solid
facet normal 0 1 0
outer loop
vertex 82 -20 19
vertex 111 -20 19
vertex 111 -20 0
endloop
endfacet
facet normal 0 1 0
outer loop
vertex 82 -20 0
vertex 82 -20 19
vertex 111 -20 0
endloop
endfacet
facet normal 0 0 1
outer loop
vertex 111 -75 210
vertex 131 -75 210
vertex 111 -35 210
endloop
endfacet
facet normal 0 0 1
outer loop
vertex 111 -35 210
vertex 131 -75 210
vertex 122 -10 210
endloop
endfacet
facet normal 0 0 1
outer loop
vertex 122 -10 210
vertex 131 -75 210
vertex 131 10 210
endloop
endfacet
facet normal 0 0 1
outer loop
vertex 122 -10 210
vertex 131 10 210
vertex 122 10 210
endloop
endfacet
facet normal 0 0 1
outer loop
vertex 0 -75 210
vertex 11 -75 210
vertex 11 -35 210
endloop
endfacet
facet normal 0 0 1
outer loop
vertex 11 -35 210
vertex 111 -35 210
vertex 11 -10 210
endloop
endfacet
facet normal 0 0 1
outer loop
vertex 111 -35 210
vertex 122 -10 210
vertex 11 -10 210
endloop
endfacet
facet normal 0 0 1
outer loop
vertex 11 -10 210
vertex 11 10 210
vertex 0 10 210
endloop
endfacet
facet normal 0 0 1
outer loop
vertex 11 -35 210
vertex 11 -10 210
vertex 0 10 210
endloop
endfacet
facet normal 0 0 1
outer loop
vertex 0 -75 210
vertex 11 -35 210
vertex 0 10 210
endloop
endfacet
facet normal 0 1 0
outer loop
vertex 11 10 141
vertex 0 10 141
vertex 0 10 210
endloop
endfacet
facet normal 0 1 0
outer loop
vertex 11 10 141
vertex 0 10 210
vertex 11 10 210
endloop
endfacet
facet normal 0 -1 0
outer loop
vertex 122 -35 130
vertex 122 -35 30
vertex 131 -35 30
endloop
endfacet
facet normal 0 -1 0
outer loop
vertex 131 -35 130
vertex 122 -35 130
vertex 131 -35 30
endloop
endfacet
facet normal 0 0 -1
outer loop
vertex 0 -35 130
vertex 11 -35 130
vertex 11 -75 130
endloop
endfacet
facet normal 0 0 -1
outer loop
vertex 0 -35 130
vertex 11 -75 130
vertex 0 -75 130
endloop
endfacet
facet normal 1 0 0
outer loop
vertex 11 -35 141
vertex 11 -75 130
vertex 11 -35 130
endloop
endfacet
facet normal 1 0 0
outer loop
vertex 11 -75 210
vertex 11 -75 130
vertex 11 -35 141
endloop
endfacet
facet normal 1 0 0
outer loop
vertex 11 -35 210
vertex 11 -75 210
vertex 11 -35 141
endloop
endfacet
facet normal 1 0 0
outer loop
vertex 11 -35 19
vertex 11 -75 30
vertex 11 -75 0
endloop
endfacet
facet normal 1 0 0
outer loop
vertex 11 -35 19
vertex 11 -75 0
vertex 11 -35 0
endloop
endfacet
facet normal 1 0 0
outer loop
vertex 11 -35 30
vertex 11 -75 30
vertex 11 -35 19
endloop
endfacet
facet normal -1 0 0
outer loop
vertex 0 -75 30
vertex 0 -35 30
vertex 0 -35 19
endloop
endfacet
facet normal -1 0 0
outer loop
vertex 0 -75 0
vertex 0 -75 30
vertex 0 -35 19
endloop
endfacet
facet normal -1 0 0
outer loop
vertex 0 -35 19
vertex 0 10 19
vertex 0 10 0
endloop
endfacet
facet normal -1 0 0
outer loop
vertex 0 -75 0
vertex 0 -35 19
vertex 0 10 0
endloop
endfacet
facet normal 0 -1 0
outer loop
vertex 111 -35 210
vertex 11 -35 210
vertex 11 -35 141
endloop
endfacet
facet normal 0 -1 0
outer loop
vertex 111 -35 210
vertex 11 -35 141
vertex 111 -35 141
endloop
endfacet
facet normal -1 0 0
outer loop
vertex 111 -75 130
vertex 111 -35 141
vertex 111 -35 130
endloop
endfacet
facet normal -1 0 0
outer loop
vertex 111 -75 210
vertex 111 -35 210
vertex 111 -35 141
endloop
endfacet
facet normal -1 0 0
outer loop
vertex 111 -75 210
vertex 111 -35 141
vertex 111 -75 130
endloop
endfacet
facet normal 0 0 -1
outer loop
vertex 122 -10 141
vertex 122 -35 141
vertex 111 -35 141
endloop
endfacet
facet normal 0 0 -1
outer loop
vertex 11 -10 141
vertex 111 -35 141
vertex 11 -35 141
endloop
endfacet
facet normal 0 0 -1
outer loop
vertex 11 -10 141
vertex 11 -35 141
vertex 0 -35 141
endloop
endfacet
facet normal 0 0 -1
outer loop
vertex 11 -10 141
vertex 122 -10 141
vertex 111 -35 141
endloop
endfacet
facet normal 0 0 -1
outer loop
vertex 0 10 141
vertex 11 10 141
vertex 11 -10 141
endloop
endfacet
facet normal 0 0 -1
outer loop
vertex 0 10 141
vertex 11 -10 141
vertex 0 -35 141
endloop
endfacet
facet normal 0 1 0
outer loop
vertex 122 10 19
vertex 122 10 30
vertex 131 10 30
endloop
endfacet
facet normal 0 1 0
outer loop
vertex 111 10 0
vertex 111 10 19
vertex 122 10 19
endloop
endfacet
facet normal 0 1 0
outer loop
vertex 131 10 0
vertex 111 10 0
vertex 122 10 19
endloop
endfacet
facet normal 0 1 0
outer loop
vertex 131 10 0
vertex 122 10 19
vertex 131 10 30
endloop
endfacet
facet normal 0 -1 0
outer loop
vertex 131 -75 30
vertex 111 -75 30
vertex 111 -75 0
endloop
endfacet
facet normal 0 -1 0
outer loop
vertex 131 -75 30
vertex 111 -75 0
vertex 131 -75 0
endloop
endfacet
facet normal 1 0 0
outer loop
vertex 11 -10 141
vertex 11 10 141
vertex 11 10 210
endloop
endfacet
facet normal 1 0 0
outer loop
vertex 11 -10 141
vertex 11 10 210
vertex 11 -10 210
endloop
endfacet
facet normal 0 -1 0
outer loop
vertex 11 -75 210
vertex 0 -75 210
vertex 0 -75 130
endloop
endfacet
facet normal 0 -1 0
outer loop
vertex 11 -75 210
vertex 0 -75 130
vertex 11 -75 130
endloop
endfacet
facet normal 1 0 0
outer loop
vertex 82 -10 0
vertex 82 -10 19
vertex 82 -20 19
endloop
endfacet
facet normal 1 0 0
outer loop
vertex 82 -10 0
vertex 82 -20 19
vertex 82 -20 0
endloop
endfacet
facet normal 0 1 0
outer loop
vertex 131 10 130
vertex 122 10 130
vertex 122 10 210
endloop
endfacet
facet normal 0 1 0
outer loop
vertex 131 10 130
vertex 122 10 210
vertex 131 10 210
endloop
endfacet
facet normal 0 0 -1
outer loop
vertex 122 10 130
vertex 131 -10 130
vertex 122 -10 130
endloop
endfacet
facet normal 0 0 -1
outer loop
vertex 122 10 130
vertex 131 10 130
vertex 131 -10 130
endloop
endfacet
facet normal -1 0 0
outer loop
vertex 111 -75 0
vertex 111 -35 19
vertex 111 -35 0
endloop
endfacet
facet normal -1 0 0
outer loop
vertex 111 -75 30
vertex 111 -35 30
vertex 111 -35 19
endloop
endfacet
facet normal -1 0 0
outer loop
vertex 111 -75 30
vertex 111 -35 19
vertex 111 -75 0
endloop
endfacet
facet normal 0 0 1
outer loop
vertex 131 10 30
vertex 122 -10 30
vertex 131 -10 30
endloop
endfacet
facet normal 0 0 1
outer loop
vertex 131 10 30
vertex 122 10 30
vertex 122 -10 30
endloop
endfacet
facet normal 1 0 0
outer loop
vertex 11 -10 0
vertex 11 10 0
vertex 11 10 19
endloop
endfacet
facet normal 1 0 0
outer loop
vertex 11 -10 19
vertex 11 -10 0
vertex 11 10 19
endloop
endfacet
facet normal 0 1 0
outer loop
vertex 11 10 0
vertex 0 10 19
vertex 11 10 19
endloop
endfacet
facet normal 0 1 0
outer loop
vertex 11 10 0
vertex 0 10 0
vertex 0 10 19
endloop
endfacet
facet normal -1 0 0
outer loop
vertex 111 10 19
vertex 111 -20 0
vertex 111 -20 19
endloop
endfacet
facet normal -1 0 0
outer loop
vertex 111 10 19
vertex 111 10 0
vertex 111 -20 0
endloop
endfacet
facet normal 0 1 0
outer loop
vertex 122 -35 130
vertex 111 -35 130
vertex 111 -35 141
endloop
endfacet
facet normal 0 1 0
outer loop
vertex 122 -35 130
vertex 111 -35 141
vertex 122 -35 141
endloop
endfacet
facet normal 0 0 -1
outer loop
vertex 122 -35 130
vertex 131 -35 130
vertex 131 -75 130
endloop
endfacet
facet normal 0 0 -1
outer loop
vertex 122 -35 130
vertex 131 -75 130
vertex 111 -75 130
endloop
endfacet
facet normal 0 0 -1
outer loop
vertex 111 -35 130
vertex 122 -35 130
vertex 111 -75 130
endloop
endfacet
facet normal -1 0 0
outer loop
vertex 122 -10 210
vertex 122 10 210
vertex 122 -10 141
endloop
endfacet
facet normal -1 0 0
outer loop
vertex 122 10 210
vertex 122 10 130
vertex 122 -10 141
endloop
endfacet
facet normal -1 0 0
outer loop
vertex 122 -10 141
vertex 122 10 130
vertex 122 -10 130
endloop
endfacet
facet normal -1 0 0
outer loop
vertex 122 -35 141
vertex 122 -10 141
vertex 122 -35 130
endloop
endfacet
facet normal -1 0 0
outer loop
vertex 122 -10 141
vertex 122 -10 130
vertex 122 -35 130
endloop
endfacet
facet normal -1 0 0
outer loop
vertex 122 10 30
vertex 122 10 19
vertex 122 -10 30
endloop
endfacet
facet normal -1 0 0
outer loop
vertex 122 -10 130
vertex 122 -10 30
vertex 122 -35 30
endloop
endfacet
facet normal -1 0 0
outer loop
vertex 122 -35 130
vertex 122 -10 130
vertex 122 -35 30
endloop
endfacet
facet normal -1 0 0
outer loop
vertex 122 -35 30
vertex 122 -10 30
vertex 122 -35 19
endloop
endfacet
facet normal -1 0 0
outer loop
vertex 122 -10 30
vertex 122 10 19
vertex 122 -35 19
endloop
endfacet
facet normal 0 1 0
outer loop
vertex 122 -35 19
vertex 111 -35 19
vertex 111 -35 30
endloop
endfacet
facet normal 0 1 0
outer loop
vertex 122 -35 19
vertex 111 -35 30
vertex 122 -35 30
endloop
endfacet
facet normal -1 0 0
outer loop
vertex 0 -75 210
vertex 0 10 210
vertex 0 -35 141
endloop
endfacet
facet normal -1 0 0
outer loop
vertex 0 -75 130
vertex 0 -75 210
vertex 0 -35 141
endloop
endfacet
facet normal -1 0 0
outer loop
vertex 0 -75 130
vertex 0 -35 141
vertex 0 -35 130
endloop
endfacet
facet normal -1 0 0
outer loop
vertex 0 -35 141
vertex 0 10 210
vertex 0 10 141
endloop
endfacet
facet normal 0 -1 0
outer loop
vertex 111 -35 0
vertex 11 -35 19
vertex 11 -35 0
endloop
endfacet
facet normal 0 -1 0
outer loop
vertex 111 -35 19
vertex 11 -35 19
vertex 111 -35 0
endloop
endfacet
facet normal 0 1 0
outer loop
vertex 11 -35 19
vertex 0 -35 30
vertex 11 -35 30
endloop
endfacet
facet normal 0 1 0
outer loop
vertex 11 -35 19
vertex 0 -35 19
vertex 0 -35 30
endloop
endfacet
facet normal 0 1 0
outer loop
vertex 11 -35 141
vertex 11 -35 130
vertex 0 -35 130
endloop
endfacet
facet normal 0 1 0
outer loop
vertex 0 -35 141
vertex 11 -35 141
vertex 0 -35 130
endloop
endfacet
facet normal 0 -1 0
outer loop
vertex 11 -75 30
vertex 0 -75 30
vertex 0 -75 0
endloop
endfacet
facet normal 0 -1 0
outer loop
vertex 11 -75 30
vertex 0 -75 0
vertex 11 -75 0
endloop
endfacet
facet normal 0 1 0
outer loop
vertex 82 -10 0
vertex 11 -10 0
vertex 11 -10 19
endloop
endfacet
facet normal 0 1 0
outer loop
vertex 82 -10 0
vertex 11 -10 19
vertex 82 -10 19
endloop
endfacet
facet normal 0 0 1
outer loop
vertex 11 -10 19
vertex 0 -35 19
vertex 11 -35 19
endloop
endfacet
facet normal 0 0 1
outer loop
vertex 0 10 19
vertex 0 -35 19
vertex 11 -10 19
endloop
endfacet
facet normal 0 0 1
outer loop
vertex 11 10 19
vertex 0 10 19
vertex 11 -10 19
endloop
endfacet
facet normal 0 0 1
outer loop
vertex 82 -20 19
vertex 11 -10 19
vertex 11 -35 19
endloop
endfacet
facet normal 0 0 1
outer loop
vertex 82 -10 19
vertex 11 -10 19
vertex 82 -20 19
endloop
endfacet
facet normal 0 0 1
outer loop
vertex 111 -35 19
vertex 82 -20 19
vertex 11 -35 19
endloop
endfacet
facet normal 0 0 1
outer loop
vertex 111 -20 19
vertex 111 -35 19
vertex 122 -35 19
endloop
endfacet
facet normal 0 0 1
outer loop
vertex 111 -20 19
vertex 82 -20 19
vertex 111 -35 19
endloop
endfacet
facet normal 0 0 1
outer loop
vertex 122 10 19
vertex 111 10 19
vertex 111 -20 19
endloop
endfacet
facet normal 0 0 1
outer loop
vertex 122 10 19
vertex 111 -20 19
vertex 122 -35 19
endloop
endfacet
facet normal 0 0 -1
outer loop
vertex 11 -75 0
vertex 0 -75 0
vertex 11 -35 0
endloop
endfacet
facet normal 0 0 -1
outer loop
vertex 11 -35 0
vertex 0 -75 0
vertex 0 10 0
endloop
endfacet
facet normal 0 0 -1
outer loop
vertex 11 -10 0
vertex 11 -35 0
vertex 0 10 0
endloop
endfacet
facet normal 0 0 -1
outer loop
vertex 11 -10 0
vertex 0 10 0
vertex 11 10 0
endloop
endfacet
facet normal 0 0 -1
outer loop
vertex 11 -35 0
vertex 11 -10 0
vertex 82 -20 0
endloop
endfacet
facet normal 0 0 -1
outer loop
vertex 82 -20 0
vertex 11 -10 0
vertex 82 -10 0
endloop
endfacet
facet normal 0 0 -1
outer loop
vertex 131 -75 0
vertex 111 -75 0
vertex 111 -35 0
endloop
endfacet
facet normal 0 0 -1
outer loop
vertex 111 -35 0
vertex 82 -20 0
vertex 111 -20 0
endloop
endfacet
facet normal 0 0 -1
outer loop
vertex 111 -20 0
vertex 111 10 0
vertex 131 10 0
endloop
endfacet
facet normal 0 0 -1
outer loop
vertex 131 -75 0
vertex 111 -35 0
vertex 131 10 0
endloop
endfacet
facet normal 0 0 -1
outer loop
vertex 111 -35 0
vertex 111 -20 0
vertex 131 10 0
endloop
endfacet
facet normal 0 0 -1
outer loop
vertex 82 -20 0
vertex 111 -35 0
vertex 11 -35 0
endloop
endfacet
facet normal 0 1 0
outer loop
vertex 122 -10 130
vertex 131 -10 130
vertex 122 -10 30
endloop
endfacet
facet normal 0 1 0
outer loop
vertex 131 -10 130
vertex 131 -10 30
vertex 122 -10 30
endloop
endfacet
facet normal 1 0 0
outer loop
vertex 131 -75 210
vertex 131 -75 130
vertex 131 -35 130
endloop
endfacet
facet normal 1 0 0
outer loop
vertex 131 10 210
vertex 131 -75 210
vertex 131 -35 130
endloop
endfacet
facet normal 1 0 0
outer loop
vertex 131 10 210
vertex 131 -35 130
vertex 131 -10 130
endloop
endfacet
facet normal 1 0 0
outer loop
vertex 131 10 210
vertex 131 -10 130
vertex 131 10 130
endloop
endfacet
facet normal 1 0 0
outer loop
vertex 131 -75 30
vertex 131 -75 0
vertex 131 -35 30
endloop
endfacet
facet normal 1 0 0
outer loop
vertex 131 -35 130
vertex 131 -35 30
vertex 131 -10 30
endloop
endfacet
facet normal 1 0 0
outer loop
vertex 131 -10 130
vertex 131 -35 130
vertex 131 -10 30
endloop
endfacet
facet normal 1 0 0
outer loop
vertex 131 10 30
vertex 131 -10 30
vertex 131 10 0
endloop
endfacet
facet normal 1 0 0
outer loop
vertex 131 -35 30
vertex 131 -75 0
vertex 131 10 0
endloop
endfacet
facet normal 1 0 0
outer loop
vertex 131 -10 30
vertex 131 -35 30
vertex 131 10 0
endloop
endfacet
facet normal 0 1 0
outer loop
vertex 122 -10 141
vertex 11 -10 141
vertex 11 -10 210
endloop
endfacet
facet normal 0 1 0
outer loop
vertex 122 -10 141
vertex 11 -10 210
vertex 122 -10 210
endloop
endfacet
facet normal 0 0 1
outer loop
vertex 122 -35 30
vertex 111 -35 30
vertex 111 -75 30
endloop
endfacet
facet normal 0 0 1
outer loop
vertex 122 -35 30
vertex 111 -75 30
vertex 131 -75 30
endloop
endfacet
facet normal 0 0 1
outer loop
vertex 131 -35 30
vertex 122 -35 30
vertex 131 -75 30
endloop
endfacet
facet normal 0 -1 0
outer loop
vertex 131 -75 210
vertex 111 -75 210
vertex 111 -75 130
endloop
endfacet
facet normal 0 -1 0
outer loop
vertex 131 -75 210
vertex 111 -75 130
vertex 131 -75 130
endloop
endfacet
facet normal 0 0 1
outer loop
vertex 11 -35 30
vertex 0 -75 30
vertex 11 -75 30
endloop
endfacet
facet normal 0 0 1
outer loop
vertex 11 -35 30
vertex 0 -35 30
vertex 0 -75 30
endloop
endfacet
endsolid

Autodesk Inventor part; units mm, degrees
ref_plane "YZ Plane" through (0, 0, 0) normal (1, 0, 0) x (0, 1, 0)
ref_plane "XZ Plane" through (0, 0, 0) normal (0, 1, 0) x (-1, 0, 0)
ref_plane "XY Plane" through (0, 0, 0) normal (0, 0, 1) x (1, 0, 0)
sketch "Sketch1" plane through (0, 0, 0) normal (0, 1, 0) x (-1, 0, 0)
  point P0 (0, 0)
sketch "Sketch2" plane through (0, 0, 0) normal (0, 1, 0) x (-1, 0, 0)
  line L0 (0, 0) -> (-160, 0)
  line L1 (-160, 0) -> (-160, 210)
  line L2 (-160, 210) -> (0, 210)
  line L3 (0, 210) -> (0, 0)
  dimension "d0" = 160
  dimension "d1" = 210
extrude "Extrusion1" add sketch "Sketch2" against normal blind 55
sketch "Sketch3" plane through (0, 0, 0) normal (-1, 0, 0) x (0, 0, 1)
  line L0 (0, 0) -> (0, -55) projected
  line L1 (0, 0) -> (9, 0)
  line L2 (9, 0) -> (9, -10)
  line L3 (9, -10) -> (0, -10)
  line L4 (0, -10) -> (0, 0)
  line L5 (0, 0) -> (210, 0) projected
  line L6 (9, -10) -> (131, -10)
  line L7 (131, -10) -> (131, 0)
  line L8 (131, 0) -> (9, 0)
  line L9 (9, 0) -> (9, -10)
  dimension "d4" = 9
  dimension "d5" = 10
  dimension "d6" = 122
extrude "Extrusion2" cut sketch "Sketch3" against normal blind 122 contours L5 L7 L6 L2
sketch "Sketch4" plane through (160, 0, 210) normal (1, 0, 0) x (0, 0, -1)
  line L0 (210, 0) -> (210, -55) projected
  line L1 (210, -55) -> (0, -55)
  line L2 (0, -55) -> (0, 0)
  line L3 (0, 0) -> (210, 0)
  line L4 (210, 0) -> (210, -55)
extrude "Extrusion3" cut sketch "Sketch4" against normal blind 29
sketch "Sketch5" plane through (0, -10, 131) normal (0, 1, 0) x (1, 0, 0)
  line L0 (122, 122) -> (122, 0) projected
  line L1 (0, 122) -> (122, 122)
  line L2 (122, 122) -> (122, 0)
  line L3 (122, 0) -> (0, 0)
  line L4 (0, 0) -> (0, 122)
  point P0 (0, 131)
extrude "Extrusion4" cut sketch "Sketch5" against normal blind 25
sketch "Sketch6" plane through (0, -35, 131) normal (0, 1, 0) x (1, 0, 0)
  line L0 (0, 122) -> (122, 122) projected
  line L1 (0, 122) -> (11, 122)
  line L2 (11, 122) -> (11, 111)
  line L3 (11, 111) -> (0, 111)
  line L4 (0, 111) -> (0, 122)
  line L5 (122, 122) -> (122, 0) projected
  line L6 (122, 122) -> (111, 122)
  line L7 (111, 122) -> (111, 111)
  line L8 (111, 111) -> (122, 111)
  line L9 (122, 111) -> (122, 122)
  line L10 (11, 111) -> (111, 111)
  line L11 (111, 111) -> (111, 11)
  line L12 (111, 11) -> (11, 11)
  line L13 (11, 11) -> (11, 111)
  point P0 (0, 131)
  dimension "d13" = 11
  dimension "d14" = 11
  dimension "d15" = 11
  dimension "d16" = 11
  dimension "d17" = 100
extrude "Extrusion5" cut sketch "Sketch6" against normal blind 20 contours L10 L11 L12 L13
sketch "Sketch7" plane through (0, -35, 131) normal (0, 1, 0) x (1, 0, 0)
  line L0 (11, 11) -> (11, 111) projected
  line L1 (0, 122) -> (122, 122) projected
  line L2 (11, 111) -> (111, 111)
  line L3 (111, 111) -> (111, 122)
  line L4 (111, 122) -> (11, 122)
  line L5 (11, 122) -> (11, 111)
  line L6 (0, 0) -> (0, 122) projected
  line L7 (11, 111) -> (0, 111)
  line L8 (0, 111) -> (0, 11)
  line L9 (0, 11) -> (11, 11)
  line L10 (11, 11) -> (11, 111)
  line L11 (111, 111) -> (111, 11) projected
  line L12 (122, 122) -> (122, 0) projected
  line L13 (111, 111) -> (122, 111)
  line L14 (122, 111) -> (122, 11)
  line L15 (122, 11) -> (111, 11)
  line L16 (111, 11) -> (111, 111)
  line L17 (111, 11) -> (11, 11) projected
  line L18 (11, 11) -> (111, 11)
  line L19 (111, 11) -> (111, 0)
  line L20 (111, 0) -> (11, 0)
  line L21 (11, 0) -> (11, 11)
  point P0 (0, 131)
  dimension "d20" = 100
  dimension "d21" = 100
  dimension "d22" = 100
  dimension "d23" = 11
extrude "Extrusion6" cut sketch "Sketch7" against normal blind 20 contours L9 L6 L7 L0 | L17 L19 L20 L21 | L5 L1 L3 L2 | L11 L13 L12 L15
sketch "Sketch8" plane through (0, 0, 0) normal (0, 1, 0) x (1, 0, 0)
  line L0 (0, 0) -> (131, 0) projected
  line L1 (0, -9) -> (122, -9) projected
  line L2 (131, 0) -> (111, 0)
  line L3 (111, 0) -> (111, -9)
  line L4 (111, -9) -> (131, -9)
  line L5 (131, -9) -> (131, 0)
  line L6 (111, 0) -> (11, 0)
  line L7 (11, 0) -> (11, -9)
  line L8 (11, -9) -> (111, -9)
  line L9 (111, -9) -> (111, 0)
  line L10 (131, -9) -> (122, -9)
  line L11 (122, -9) -> (122, -119)
  line L12 (122, -119) -> (131, -119)
  line L13 (131, -119) -> (131, -9)
  dimension "d26" = 20
  dimension "d27" = 100
  dimension "d28" = 9
  dimension "d29" = 110
extrude "Extrusion7" cut sketch "Sketch8" against normal blind 10 contours L0 L3 L1 L7 | L13 L12 L11 L4
sketch "Sketch10" plane through (0, -35, 9) normal (0, 0, 1) x (1, 0, 0)
  line L0 (111, 35) -> (131, 35) projected
  line L1 (131, 35) -> (122, 35)
  line L2 (122, 35) -> (122, 25)
  line L3 (122, 25) -> (131, 25)
  line L4 (131, 25) -> (131, 35)
  point P0 (0, 35)
extrude "Extrusion8" add sketch "Sketch10" along normal blind 11
sketch "Sketch11" plane through (122, 0, 131) normal (0, 0, -1) x (-1, 0, 0)
  line L0 (0, 0) -> (122, 0) projected
  line L1 (0, 0) -> (111, 0)
  line L2 (111, 0) -> (111, -10)
  line L3 (111, -10) -> (0, -10)
  line L4 (0, -10) -> (0, 0)
  dimension "d38" = 111
  dimension "d39" = 10
extrude "Extrusion9" cut sketch "Sketch11" against normal blind 80
sketch "Sketch12" plane through (0, -55, 210) normal (0, 0, 1) x (1, 0, 0)
  line L0 (122, 45) -> (11, 45) projected
  line L1 (11, 45) -> (11, 20)
  line L2 (131, 0) -> (0, 0) projected
  line L3 (11, 20) -> (111, 20)
  line L4 (111, 20) -> (111, 0)
  line L5 (111, 0) -> (11, 0)
  line L6 (11, 0) -> (11, 20)
  point P0 (0, 55)
  dimension "d42" = 25
  dimension "d43" = 100
extrude "Extrusion10" cut sketch "Sketch12" against normal blind 220
sketch "Sketch13" plane through (122, 0, 0) normal (-1, 0, 0) x (0, 0, 1)
  line L0 (0, -55) -> (210, -55) projected
  line L1 (20, -35) -> (120, -35)
  line L2 (120, -35) -> (120, -55)
  line L3 (120, -55) -> (20, -55)
  line L4 (20, -55) -> (20, -35)
  point P0 (0, 0)
  dimension "d46" = 100
extrude "Extrusion11" cut sketch "Sketch13" against normal blind 9
sketch "Sketch14" plane through (0, -35, 9) normal (0, 0, 1) x (1, 0, 0)
  line L0 (0, 35) -> (11, 35) projected
  line L1 (0, 35) -> (11, 35)
  line L2 (11, 35) -> (11, 0)
  line L3 (11, 0) -> (0, 0)
  line L4 (0, 0) -> (0, 35)
  line L5 (111, 25) -> (11, 25) projected
  line L6 (111, 0) -> (122, 0) projected
  line L7 (11, 25) -> (122, 25)
  line L8 (122, 25) -> (122, 0)
  line L9 (122, 0) -> (11, 0)
  line L10 (11, 0) -> (11, 25)
  line L11 (111, 25) -> (111, 35) projected
  line L12 (111, 35) -> (122, 35)
  line L13 (122, 35) -> (122, 25)
  line L14 (122, 25) -> (111, 25)
  line L15 (111, 25) -> (111, 35)
sketch "Sketch15" plane through (0, -35, 20) normal (0, 0, 1) x (1, 0, 0)
  line L0 (11, 0) -> (11, -20) projected
  line L1 (0, -20) -> (11, -20)
  line L2 (11, -20) -> (11, 0)
  line L3 (11, 0) -> (0, 0)
  line L4 (0, 0) -> (0, -20)
  line L5 (131, 0) -> (131, -20) projected
  line L6 (111.5686, -20) -> (131, -20)
  line L7 (131, -20) -> (131, 0)
  line L8 (131, 0) -> (111.5686, 0)
  line L9 (122, 35) -> (122, 25) projected
  line L10 (131, 25) -> (122, 25) projected
  line L11 (122, 35) -> (131, 35)
  line L12 (131, 35) -> (131, 25)
  line L13 (131, 25) -> (122, 25)
  line L14 (122, 25) -> (122, 35)
  line L15 (111, 0) -> (111, -20) projected
  line L16 (111, 0) -> (131, 0)
  line L17 (131, 0) -> (131, -20)
  line L18 (131, -20) -> (111, -20)
  line L19 (111, -20) -> (111, 0)
  point P0 (0, 35)
extrude "Extrusion12" add sketch "Sketch14" along normal blind 10
extrude "Extrusion13" add sketch "Sketch15" along normal blind 10
sketch "Sketch16" plane through (0, -35, 131) normal (0, 0, -1) x (-1, 0, 0)
  line L0 (-11, 35) -> (-11, 25) projected
  line L1 (-11, 0) -> (0, 0) projected
  line L2 (-11, 35) -> (0, 35)
  line L3 (0, 35) -> (0, 0)
  line L4 (0, 0) -> (-11, 0)
  line L5 (-11, 0) -> (-11, 35)
  line L6 (-11, 25) -> (-122, 25) projected
  line L7 (-122, 25) -> (-122, 0) projected
  line L8 (-11, 25) -> (-122, 25)
  line L9 (-122, 25) -> (-122, 0)
  line L10 (-122, 0) -> (-11, 0)
  line L11 (-11, 0) -> (-11, 25)
extrude "Extrusion14" cut sketch "Sketch16" against normal blind 10
sketch "Sketch18" plane through (131, -55, 120) normal (0, 0, -1) x (-1, 0, 0)
  line L0 (0, 0) -> (0, 20) projected
  line L1 (9, 20) -> (20, 20) projected
  line L2 (0, 0) -> (20, 0)
  line L3 (20, 0) -> (20, 20)
  line L4 (20, 20) -> (0, 20)
  line L5 (0, 20) -> (0, 0)
  line L6 (120, 20) -> (120, 0) projected
  line L7 (131, 20) -> (131, 0) projected
  line L8 (120, 0) -> (131, 0)
  line L9 (131, 0) -> (131, 20)
  line L10 (131, 20) -> (120, 20)
  line L11 (120, 20) -> (120, 0)
  point P0 (131, 55)
extrude "Extrusion15" cut sketch "Sketch18" against normal blind 10
sketch "Sketch19" plane through (131, 0, 119) normal (0, 0, -1) x (-1, 0, 0)
  line L0 (0, -10) -> (9, -10) projected
  line L1 (9, -10) -> (0, -10)
  line L2 (0, -10) -> (0, 0)
  line L3 (0, 0) -> (9, 0)
  line L4 (9, 0) -> (9, -10)
  point P0 (131, 0)
extrude "Extrusion16" cut sketch "Sketch19" against normal blind 11
sketch "Sketch20" plane through (0, -35, 19) normal (0, 0, 1) x (1, 0, 0)
  line L0 (11, 25) -> (111, 25) projected
  line L1 (111, 25) -> (92, 25)
  line L2 (92, 25) -> (92, 15)
  line L3 (92, 15) -> (111, 15)
  line L4 (111, 15) -> (111, 25)
  point P0 (0, 35)
  dimension "d59" = 19
  dimension "d60" = 10
extrude "Extrusion17" cut sketch "Sketch20" against normal blind 19
sketch "Sketch21" plane through (92, -20, 19) normal (1, 0, 0) x (0, 0, -1)
  line L0 (0, 0) -> (0, 10) projected
  line L1 (19, 10) -> (19, 0) projected
  line L2 (0, 0) -> (19, 0)
  line L3 (19, 0) -> (19, 10)
  line L4 (19, 10) -> (0, 10)
  line L5 (0, 10) -> (0, 0)
  point P0 (19, 20)
extrude "Extrusion18" cut sketch "Sketch21" against normal blind 10
sketch "Sketch22" plane through (0, -55, 0) normal (0, -1, 0) x (1, 0, 0)
  line L0 (11, 210) -> (0, 210) projected
  line L1 (11, 141) -> (11, 130) projected
  line L2 (0, 210) -> (11, 210)
  line L3 (11, 210) -> (11, 130)
  line L4 (11, 130) -> (0, 130)
  line L5 (0, 130) -> (0, 210)
  line L6 (11, 210) -> (111, 210) projected
  line L7 (131, 130) -> (131, 210) projected
  line L8 (111, 210) -> (131, 210)
  line L9 (131, 210) -> (131, 130)
  line L10 (131, 130) -> (111, 130)
  line L11 (111, 130) -> (111, 210)
  line L12 (0, 30) -> (0, 19) projected
  line L13 (11, 19) -> (11, 0) projected
  line L14 (0, 30) -> (11, 30)
  line L15 (11, 30) -> (11, 0)
  line L16 (11, 0) -> (0, 0)
  line L17 (0, 0) -> (0, 30)
  line L18 (131, 30) -> (131, 0) projected
  line L19 (111, 30) -> (131, 30)
  line L20 (131, 30) -> (131, 0)
  line L21 (131, 0) -> (111, 0)
  line L22 (111, 0) -> (111, 30)
extrude "Extrusion19" add sketch "Sketch22" along normal blind 20
sketch "Sketch23" plane through (0, 0, 0) normal (0, 1, 0) x (1, 0, 0)
  line L0 (0, 0) -> (11, 0) projected
  line L1 (11, -19) -> (11, 0) projected
  line L2 (0, 0) -> (11, 0)
  line L3 (11, 0) -> (11, -19)
  line L4 (11, -19) -> (0, -19)
  line L5 (0, -19) -> (0, 0)
  line L6 (111, 0) -> (111, -19) projected
  line L7 (122, -19) -> (122, -30) projected
  line L8 (111, 0) -> (122, 0)
  line L9 (122, 0) -> (122, -19)
  line L10 (122, -19) -> (111, -19)
  line L11 (111, -19) -> (111, 0)
  line L12 (131, -30) -> (131, 0) projected
  line L13 (122, -30) -> (131, -30)
  line L14 (131, -30) -> (131, 0)
  line L15 (131, 0) -> (122, 0)
  line L16 (122, 0) -> (122, -30)
  line L17 (122, -130) -> (122, -210) projected
  line L18 (131, -210) -> (131, -130) projected
  line L19 (122, -130) -> (131, -130)
  line L20 (131, -130) -> (131, -210)
  line L21 (131, -210) -> (122, -210)
  line L22 (122, -210) -> (122, -130)
  line L23 (11, -210) -> (11, -141) projected
  line L24 (0, -141) -> (11, -141)
  line L25 (11, -141) -> (11, -210)
  line L26 (11, -210) -> (0, -210)
  line L27 (0, -210) -> (0, -141)
extrude "Extrusion20" add sketch "Sketch23" along normal blind 10
properties part number "120mmLaptopStand-Right"
